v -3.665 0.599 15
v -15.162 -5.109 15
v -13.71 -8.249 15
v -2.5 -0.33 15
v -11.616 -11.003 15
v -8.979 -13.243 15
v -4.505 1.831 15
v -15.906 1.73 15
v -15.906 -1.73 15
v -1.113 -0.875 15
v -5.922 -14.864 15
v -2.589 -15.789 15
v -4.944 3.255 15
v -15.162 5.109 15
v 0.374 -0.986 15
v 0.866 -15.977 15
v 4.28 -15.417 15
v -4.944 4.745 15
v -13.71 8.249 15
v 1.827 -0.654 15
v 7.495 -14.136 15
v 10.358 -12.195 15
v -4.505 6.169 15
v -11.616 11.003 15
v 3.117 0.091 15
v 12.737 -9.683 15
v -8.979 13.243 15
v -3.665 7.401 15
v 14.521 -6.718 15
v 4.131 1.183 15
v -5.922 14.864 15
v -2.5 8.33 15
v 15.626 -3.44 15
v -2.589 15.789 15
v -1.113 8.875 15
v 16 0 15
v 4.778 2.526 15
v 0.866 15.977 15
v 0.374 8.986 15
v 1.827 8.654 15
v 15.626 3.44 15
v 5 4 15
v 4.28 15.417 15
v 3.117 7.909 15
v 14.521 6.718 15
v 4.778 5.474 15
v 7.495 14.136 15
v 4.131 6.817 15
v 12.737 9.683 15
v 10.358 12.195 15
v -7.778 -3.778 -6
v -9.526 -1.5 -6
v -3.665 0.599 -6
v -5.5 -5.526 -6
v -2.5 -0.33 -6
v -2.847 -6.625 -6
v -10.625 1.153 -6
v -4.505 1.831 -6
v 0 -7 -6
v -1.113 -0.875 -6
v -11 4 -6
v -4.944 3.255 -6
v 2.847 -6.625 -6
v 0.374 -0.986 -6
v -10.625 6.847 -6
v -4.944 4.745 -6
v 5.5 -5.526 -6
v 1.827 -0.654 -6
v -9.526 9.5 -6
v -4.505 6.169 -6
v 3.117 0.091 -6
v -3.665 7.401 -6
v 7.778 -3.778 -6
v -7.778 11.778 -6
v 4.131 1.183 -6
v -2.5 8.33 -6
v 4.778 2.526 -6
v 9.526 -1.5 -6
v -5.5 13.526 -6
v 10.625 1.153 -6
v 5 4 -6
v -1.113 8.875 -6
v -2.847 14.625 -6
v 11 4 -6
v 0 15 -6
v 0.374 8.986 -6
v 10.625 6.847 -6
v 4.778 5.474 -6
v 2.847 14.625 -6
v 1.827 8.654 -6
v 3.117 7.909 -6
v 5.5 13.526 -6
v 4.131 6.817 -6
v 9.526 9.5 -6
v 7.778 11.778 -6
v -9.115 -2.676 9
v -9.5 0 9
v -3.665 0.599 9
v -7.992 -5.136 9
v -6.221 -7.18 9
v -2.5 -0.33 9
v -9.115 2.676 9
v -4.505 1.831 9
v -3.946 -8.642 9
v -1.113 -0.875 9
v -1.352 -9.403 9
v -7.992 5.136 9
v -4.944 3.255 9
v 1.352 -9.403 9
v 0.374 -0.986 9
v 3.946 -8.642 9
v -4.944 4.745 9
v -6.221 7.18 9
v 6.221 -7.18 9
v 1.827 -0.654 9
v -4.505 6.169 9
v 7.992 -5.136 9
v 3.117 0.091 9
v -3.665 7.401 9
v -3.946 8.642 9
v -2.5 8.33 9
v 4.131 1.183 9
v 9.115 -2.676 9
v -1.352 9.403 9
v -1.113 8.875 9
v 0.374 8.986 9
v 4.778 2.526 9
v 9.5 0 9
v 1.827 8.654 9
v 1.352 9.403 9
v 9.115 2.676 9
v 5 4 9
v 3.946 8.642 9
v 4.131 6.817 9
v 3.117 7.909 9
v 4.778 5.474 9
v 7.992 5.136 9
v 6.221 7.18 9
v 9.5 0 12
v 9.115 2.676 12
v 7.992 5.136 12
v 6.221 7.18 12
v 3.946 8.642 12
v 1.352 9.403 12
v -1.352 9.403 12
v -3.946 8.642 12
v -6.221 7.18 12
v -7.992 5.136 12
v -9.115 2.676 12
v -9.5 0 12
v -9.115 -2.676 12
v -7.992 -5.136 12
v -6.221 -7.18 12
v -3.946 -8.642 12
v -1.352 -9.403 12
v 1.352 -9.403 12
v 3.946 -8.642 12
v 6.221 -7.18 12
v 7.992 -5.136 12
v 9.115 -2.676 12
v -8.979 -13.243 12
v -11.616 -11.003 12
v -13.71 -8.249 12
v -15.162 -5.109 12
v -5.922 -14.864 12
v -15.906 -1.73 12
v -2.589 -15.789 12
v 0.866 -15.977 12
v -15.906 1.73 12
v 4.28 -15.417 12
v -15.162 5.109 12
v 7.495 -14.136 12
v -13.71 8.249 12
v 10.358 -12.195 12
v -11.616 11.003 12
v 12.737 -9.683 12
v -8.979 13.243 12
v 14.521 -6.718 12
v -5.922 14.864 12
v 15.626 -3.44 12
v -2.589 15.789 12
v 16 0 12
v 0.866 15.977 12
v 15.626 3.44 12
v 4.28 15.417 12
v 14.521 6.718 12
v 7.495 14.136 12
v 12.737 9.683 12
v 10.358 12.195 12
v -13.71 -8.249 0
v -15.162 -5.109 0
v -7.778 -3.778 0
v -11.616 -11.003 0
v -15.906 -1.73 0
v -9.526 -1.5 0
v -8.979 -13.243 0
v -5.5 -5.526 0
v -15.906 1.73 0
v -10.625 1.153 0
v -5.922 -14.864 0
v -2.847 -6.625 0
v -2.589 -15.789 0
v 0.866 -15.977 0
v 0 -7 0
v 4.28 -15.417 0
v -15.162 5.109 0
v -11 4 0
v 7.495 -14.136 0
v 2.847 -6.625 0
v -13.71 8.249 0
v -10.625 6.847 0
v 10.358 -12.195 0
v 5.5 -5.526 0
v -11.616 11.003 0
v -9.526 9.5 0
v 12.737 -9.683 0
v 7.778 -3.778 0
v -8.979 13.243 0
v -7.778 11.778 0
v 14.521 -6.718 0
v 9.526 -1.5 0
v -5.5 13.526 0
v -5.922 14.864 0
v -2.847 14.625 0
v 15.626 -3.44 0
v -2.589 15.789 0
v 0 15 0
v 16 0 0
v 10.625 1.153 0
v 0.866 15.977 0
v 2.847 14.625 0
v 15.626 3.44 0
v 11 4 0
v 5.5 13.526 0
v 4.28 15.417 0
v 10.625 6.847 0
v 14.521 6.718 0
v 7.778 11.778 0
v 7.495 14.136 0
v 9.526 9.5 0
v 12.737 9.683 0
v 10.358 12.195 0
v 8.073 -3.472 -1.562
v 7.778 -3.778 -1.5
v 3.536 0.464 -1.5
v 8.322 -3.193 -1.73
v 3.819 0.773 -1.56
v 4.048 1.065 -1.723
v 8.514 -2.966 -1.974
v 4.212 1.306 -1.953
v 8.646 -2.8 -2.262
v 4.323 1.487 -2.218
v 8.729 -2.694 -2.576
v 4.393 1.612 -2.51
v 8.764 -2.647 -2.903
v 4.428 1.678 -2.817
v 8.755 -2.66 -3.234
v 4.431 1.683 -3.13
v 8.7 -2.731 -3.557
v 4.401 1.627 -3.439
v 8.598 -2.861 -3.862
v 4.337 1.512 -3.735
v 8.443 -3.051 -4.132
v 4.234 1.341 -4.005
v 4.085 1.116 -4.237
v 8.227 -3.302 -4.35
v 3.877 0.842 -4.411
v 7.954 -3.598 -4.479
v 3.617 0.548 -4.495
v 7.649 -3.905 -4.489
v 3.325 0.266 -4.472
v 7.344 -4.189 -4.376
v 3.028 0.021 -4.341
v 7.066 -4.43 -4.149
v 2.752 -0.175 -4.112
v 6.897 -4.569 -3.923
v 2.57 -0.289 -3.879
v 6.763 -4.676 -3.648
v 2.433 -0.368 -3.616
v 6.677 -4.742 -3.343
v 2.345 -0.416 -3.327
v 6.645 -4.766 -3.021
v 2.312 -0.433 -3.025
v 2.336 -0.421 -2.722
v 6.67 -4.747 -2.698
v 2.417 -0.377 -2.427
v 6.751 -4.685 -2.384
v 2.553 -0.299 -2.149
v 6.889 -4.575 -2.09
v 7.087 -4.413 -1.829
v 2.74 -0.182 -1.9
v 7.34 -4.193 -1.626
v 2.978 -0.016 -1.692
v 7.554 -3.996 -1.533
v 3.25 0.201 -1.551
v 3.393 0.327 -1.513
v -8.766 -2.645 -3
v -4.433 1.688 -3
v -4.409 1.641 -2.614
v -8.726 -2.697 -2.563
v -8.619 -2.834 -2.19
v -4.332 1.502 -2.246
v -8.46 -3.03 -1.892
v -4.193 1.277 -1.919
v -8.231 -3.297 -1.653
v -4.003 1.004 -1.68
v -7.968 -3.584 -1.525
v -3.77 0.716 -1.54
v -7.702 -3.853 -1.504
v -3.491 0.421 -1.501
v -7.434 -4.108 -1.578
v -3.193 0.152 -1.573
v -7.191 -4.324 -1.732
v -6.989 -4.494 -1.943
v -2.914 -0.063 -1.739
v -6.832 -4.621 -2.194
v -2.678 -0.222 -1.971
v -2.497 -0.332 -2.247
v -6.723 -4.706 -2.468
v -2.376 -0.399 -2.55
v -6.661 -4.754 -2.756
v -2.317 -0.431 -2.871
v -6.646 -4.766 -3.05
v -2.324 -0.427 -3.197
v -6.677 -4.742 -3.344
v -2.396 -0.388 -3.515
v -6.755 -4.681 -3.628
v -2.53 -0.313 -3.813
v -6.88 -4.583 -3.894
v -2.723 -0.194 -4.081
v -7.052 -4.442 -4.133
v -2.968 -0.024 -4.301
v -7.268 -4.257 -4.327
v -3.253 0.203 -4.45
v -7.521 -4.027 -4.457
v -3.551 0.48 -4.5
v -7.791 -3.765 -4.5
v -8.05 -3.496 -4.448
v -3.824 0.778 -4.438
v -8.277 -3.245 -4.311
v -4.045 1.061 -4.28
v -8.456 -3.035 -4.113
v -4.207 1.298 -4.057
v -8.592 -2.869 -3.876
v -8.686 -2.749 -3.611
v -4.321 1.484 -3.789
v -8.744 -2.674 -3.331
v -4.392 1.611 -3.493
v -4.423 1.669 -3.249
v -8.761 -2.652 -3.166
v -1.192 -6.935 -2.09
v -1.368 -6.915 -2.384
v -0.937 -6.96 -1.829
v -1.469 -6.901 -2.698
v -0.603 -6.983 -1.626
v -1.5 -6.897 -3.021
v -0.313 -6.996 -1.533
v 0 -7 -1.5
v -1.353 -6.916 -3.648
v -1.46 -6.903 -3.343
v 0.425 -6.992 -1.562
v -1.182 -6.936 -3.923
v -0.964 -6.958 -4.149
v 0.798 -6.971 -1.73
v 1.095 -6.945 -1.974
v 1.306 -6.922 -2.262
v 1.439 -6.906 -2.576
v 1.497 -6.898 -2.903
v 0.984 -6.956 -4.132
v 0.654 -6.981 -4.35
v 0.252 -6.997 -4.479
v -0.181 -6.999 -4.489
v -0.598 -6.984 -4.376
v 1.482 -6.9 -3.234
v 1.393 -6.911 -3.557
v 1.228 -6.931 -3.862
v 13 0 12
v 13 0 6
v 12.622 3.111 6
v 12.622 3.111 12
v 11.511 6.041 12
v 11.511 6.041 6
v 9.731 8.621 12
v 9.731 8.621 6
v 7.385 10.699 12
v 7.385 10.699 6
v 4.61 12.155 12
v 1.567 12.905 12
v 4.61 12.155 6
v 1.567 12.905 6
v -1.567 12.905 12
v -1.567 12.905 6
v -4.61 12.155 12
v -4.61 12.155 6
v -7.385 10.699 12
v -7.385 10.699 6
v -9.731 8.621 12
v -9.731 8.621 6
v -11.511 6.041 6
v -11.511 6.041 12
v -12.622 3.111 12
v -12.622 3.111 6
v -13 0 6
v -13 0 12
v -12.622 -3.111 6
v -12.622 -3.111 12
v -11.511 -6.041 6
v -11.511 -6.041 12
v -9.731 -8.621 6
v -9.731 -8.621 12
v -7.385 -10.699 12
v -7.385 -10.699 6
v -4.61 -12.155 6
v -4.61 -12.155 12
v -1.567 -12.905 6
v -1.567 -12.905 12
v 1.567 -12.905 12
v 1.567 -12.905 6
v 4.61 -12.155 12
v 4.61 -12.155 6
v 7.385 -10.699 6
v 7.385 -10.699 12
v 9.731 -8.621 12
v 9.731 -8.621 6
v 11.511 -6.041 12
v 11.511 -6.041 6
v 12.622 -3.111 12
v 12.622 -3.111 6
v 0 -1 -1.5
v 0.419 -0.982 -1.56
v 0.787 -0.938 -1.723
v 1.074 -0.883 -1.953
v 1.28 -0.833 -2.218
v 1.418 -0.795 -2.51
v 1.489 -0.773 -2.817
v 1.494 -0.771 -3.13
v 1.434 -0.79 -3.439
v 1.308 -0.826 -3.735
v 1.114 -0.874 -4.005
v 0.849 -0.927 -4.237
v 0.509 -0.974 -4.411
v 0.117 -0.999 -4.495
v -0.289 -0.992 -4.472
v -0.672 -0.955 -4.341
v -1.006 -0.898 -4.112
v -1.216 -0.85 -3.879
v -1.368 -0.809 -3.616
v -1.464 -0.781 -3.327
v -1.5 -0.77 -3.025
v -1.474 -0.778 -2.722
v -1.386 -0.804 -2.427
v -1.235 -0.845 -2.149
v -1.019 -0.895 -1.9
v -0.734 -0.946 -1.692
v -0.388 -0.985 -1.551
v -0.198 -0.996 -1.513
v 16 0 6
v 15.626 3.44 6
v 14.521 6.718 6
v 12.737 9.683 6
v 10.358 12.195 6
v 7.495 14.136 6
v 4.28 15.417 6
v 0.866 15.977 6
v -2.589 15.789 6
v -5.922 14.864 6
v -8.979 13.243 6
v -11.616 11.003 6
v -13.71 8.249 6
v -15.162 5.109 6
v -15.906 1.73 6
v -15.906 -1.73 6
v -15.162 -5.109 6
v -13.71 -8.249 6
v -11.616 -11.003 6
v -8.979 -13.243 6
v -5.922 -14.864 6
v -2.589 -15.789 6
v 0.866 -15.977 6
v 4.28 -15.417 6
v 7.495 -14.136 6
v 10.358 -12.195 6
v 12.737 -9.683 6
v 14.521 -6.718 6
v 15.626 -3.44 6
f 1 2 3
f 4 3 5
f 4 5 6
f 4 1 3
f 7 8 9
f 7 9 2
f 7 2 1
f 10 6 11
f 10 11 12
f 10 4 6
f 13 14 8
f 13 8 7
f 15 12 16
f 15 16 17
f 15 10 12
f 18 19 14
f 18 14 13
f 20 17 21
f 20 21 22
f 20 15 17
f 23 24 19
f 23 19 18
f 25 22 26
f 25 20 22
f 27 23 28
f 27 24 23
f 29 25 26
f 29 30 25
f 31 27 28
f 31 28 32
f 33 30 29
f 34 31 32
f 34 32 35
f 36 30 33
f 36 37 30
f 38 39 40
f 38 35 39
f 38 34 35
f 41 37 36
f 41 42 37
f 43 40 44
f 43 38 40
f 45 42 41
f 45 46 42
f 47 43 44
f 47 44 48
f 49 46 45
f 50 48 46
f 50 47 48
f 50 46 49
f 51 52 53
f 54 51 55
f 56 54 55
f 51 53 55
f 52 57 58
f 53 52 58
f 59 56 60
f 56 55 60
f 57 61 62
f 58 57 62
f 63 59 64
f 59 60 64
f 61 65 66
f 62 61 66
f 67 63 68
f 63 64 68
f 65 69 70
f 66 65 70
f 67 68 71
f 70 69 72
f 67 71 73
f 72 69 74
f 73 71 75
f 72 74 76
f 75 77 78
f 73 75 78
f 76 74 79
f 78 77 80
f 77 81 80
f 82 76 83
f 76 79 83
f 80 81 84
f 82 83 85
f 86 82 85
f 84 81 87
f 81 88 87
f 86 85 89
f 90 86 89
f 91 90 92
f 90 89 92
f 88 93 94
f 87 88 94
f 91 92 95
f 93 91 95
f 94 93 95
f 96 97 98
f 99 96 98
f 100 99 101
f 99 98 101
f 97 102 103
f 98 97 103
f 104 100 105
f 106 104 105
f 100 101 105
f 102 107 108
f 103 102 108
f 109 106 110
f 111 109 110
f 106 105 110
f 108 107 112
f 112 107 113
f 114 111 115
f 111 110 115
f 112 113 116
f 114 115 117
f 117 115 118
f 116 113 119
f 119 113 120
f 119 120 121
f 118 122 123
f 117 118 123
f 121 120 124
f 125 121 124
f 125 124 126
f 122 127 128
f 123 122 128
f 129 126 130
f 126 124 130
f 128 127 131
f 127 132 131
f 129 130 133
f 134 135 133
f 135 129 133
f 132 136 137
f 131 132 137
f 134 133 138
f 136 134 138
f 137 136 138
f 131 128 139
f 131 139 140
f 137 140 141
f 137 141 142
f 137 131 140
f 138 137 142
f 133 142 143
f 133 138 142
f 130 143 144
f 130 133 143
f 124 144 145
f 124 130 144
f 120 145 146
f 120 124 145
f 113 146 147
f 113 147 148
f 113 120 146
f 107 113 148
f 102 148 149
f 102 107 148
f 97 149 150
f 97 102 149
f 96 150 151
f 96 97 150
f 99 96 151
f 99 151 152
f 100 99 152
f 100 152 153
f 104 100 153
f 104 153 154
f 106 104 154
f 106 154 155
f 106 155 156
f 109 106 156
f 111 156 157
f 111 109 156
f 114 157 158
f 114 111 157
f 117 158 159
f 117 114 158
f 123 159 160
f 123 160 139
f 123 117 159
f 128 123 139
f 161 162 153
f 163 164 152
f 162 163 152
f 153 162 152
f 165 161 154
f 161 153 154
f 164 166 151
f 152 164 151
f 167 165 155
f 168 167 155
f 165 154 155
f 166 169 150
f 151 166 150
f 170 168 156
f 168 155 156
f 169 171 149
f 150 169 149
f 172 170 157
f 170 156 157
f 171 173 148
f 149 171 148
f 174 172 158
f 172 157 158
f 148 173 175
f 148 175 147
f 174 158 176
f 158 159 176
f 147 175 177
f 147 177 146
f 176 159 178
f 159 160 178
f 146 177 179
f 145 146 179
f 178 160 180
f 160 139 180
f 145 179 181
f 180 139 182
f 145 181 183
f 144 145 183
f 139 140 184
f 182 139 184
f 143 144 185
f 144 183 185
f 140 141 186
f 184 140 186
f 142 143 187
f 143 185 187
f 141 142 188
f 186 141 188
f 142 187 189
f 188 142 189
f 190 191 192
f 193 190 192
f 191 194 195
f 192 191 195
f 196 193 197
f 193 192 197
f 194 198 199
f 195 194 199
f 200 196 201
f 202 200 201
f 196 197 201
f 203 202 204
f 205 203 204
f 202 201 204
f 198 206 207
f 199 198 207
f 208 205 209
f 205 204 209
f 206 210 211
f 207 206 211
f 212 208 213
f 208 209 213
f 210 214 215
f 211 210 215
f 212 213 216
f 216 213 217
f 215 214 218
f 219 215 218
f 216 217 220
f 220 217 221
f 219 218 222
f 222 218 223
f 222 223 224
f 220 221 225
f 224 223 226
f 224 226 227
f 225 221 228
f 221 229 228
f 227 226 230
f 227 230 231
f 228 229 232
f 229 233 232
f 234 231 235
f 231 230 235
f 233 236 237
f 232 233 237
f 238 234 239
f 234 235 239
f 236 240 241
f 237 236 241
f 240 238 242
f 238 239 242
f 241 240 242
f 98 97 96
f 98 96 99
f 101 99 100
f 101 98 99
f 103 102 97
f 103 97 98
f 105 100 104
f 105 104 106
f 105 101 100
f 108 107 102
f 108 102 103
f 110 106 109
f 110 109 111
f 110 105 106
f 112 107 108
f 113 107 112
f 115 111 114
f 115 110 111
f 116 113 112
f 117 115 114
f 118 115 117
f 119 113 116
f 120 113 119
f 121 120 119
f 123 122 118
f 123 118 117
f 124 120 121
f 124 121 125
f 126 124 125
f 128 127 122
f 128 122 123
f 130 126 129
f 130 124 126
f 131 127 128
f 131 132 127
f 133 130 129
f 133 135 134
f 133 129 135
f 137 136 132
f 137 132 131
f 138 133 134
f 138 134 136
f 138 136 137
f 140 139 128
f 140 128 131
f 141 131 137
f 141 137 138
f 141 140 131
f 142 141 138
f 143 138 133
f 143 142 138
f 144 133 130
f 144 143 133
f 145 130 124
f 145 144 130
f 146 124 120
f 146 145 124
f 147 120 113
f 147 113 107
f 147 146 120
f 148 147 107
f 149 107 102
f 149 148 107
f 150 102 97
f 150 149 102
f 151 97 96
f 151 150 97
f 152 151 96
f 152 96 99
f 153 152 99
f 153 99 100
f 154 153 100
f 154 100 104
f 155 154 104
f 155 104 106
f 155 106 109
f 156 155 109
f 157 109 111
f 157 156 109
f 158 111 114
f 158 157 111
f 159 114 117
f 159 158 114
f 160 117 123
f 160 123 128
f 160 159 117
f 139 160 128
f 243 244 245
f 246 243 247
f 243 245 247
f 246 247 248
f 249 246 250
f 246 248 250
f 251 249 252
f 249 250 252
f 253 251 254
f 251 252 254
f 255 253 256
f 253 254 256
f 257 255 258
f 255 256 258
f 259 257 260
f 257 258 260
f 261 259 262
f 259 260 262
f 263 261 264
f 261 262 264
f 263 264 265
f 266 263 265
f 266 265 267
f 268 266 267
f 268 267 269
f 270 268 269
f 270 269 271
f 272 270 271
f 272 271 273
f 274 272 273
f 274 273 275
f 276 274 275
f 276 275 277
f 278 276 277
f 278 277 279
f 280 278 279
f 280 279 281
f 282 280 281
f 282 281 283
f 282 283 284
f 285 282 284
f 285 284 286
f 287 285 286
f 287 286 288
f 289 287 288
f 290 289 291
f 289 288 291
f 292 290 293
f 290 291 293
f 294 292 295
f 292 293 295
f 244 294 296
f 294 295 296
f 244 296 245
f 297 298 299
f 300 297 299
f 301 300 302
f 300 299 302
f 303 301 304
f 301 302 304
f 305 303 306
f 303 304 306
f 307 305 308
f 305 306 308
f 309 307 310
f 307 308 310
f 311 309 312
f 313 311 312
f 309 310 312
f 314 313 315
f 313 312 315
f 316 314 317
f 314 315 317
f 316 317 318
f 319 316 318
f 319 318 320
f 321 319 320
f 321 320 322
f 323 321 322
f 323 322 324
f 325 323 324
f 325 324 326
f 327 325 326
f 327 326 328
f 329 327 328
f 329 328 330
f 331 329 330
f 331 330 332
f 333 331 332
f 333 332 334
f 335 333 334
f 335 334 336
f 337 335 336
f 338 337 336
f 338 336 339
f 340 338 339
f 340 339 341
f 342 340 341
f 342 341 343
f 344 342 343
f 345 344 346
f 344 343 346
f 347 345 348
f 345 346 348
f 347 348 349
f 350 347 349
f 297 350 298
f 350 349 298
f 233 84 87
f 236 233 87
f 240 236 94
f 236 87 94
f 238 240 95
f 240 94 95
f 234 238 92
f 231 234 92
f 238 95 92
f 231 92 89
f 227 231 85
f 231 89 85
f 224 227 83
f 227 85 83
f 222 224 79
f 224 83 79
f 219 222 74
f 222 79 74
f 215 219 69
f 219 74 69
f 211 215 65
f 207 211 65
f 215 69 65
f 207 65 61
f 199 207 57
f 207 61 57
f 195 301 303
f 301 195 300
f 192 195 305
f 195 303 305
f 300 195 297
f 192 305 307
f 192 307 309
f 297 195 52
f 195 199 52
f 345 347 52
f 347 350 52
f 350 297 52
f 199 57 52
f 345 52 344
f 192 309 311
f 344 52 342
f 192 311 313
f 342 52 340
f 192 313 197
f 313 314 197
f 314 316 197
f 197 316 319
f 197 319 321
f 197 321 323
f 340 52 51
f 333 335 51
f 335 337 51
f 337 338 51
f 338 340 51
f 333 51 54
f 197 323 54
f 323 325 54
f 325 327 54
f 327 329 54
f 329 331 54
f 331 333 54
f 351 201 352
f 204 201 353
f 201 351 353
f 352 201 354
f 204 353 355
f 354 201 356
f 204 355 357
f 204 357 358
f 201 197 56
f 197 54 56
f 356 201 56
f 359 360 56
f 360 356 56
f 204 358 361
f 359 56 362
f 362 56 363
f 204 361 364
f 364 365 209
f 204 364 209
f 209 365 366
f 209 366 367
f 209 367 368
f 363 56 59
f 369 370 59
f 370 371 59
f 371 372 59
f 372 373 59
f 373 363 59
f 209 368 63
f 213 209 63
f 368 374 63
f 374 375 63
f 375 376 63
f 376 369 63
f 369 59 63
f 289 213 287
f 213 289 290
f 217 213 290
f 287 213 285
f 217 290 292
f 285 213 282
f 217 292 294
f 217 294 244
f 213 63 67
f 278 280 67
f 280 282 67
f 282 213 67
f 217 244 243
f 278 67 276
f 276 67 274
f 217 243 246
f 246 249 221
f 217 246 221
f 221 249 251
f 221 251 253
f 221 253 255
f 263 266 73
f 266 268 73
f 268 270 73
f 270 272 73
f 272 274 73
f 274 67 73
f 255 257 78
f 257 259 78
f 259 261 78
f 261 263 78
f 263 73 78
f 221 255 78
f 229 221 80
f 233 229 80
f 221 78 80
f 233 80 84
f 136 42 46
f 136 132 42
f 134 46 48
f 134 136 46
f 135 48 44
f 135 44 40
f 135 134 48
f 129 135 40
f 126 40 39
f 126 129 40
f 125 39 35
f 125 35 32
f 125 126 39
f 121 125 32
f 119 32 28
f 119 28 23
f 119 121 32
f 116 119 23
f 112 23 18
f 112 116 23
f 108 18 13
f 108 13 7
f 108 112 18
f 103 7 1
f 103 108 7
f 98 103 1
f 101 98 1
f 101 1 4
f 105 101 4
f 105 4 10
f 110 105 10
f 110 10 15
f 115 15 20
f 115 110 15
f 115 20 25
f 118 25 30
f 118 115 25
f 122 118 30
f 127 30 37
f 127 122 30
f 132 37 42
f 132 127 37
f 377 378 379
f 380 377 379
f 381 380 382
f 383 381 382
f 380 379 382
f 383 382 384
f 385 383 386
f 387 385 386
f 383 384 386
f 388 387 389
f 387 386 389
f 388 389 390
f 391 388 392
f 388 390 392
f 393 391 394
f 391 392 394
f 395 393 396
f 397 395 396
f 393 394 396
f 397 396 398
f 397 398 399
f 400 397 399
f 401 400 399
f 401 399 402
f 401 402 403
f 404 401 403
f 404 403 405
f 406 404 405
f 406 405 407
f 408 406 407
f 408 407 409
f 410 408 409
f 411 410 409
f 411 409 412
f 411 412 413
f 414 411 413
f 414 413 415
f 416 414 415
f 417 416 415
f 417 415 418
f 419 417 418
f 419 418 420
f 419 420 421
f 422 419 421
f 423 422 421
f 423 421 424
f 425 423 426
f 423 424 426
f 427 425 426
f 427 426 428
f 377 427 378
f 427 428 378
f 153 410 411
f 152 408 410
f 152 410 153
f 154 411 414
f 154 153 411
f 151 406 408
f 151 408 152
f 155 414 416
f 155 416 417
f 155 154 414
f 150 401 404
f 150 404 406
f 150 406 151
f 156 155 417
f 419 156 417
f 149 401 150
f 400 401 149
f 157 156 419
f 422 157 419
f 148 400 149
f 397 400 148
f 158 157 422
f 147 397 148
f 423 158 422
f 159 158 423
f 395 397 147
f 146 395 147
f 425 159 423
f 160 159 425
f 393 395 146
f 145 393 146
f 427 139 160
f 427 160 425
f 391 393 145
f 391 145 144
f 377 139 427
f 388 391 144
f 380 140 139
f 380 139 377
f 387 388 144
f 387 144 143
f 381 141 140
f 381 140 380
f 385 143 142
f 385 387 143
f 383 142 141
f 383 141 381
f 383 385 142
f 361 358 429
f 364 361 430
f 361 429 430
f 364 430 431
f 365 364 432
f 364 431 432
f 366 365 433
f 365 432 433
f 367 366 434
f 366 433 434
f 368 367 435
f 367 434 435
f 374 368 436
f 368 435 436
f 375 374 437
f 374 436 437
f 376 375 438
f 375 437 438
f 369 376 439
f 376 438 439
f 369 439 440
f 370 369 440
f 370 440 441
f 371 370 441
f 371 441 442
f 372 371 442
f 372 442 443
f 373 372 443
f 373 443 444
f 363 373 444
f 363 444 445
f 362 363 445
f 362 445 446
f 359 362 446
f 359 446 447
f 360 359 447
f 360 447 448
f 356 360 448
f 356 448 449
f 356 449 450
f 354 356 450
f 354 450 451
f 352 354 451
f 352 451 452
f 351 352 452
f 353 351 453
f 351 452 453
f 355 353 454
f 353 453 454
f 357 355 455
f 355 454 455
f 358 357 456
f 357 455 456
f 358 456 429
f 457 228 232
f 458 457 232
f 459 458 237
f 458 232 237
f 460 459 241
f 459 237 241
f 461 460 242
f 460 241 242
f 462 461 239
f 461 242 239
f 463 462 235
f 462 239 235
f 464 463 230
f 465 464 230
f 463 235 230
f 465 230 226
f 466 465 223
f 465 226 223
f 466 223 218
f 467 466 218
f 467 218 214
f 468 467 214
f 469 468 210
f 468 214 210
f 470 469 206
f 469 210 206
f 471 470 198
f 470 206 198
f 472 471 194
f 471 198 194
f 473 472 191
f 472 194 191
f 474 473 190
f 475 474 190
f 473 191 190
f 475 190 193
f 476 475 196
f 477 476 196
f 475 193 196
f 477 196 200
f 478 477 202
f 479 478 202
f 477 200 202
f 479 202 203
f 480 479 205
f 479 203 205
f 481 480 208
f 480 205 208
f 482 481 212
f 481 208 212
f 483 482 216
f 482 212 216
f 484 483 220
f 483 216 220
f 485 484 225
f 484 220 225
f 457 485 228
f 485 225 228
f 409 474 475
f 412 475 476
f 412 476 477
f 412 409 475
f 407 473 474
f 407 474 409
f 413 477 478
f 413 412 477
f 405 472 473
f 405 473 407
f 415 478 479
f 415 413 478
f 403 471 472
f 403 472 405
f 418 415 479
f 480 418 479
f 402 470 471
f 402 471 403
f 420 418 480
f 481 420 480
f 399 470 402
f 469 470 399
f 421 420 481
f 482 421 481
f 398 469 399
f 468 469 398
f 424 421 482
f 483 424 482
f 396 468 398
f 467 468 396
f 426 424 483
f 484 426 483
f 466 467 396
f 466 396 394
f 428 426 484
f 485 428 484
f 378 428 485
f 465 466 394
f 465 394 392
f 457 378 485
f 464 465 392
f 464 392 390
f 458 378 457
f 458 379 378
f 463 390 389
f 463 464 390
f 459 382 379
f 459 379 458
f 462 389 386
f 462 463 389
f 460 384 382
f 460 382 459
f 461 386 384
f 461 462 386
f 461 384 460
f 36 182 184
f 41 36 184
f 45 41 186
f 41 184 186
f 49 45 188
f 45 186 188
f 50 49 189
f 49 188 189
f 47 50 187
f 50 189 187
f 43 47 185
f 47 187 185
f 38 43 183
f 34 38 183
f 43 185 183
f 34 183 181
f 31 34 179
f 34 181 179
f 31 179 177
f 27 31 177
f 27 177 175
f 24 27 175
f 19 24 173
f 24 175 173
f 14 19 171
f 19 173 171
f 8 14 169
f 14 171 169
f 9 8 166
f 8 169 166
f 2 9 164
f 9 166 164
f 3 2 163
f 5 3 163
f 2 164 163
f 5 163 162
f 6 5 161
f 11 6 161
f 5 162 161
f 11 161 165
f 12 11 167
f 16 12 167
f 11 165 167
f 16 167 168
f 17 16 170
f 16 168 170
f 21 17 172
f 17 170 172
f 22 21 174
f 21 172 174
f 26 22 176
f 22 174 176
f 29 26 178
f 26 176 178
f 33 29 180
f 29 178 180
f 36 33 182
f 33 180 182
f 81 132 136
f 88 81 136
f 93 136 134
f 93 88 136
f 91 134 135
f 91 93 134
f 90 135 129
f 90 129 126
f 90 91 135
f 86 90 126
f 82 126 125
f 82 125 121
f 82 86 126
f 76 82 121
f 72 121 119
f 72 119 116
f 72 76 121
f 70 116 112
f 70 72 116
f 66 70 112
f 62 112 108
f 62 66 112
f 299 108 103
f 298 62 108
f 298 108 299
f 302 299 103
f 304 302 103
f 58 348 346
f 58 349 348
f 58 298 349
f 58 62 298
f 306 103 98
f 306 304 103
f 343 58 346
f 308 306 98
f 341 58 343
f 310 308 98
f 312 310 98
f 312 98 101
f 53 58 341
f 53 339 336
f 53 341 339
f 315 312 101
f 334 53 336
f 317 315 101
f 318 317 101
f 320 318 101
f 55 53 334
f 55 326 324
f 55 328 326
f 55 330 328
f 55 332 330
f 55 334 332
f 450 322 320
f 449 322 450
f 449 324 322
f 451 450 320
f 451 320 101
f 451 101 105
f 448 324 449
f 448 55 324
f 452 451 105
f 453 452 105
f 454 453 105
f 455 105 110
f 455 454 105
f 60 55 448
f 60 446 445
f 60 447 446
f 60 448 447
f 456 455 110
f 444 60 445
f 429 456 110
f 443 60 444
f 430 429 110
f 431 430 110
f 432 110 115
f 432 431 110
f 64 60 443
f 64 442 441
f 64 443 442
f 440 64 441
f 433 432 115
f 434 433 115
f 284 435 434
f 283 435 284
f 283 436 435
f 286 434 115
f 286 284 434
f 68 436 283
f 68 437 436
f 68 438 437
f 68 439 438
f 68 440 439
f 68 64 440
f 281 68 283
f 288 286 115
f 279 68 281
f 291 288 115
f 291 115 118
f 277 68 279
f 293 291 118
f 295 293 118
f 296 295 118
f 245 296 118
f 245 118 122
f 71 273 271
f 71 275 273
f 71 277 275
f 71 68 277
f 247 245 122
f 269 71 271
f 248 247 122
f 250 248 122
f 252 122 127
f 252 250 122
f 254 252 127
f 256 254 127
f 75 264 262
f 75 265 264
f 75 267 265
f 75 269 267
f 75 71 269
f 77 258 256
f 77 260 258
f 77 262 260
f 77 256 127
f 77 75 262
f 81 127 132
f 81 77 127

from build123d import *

# Parameters (mm, degrees)
SKETCH1_R                 = 16
SKETCH1_R_2               = 13
BOSS_EXTRUDE1_DEPTH       = 6
SKETCH1_4_R               = 13
SKETCH1_4_R_2             = 5
BOSS_EXTRUDE2_DEPTH       = 12
BOSS_EXTRUDE3_START       = -6
SKETCH1_5_R               = 11
SKETCH1_5_R_2             = 5
BOSS_EXTRUDE3_DEPTH       = 6
CUT_EXTRUDE1_START        = -3
SKETCH2_R                 = 9.5
SKETCH2_R_2               = 5
CUT_EXTRUDE1_DEPTH        = 3
SKETCH2_3_R               = 9.5
SKETCH2_3_R_2             = 5
BOSS_EXTRUDE4_DEPTH       = 3
SKETCH3_R                 = 16
SKETCH3_R_2               = 5
BOSS_EXTRUDE5_DEPTH       = 3
CUT_EXTRUDE2_REACH        = 29.148
CUT_EXTRUDE2_END_RADIUS   = 11
SKETCH4_R                 = 1.5
CIRPATTERN1_COUNT         = 2
CIRPATTERN1_ANGLE         = 45
MIRROR1_COPY_1_REACH      = 29.148
MIRROR1_COPY_1_END_RADIUS = 11
MIRROR1_COPY_1_SKETCH_R   = 1.5


with BuildPart() as part:
    # Sketch1 → Boss-Extrude1 (new body)
    with BuildSketch(Plane.XY):
        Circle(SKETCH1_R)
        Circle(SKETCH1_R_2, mode=Mode.SUBTRACT)
    extrude(amount=BOSS_EXTRUDE1_DEPTH)

    # Sketch1<4> → Boss-Extrude2 (add)
    with BuildSketch(Plane.XY):
        Circle(SKETCH1_4_R)
        with Locations((0, 4)):
            Circle(SKETCH1_4_R_2, mode=Mode.SUBTRACT)
    extrude(amount=BOSS_EXTRUDE2_DEPTH)

    # Sketch1<5> → Boss-Extrude3 (add)
    with BuildSketch(Plane.XY.offset(BOSS_EXTRUDE3_START)):
        with Locations((0, 4)):
            Circle(SKETCH1_5_R)
        with Locations((0, 4)):
            Circle(SKETCH1_5_R_2, mode=Mode.SUBTRACT)
    extrude(amount=BOSS_EXTRUDE3_DEPTH)

    # Sketch2 → Cut-Extrude1 (cut)
    with BuildSketch(Plane.XY.offset(12).offset(CUT_EXTRUDE1_START)):
        Circle(SKETCH2_R)
        with Locations((0, 4)):
            Circle(SKETCH2_R_2, mode=Mode.SUBTRACT)
    extrude(amount=CUT_EXTRUDE1_DEPTH, mode=Mode.SUBTRACT)

    # Cut-Extrude2: up to this cylinder (the profile starts inside it)
    cut_extrude2_end = Plane(origin=(0, 4, -3), z_dir=(0, 0, 1)) * Cylinder(CUT_EXTRUDE2_END_RADIUS, 81.296, mode=Mode.PRIVATE)
    # Sketch4 → Cut-Extrude2 (cut, up to the surface)
    with BuildSketch(Plane(origin=(0, 0, 0), x_dir=(1, 0, 0), z_dir=(0, 1, 0)), mode=Mode.PRIVATE) as cut_extrude2_sk1:
        with Locations(Location((0, 3, 0), (0, 0, 270))):
            Circle(SKETCH4_R)
    cut_extrude2_tool1 = extrude(cut_extrude2_sk1.sketch, amount=-CUT_EXTRUDE2_REACH, mode=Mode.PRIVATE) & cut_extrude2_end
    cut_extrude2 = cut_extrude2_tool1.solids().sort_by_distance((0, 0, -3))[0]
    add(cut_extrude2, mode=Mode.SUBTRACT)

    # CirPattern1: Cut-Extrude2 ×2 about axis
    cirpattern1_axis = Axis((0, 4, -6), (0, 0, 1))
    for i in range(1, CIRPATTERN1_COUNT):
        add(cut_extrude2.rotate(cirpattern1_axis, i * CIRPATTERN1_ANGLE / (CIRPATTERN1_COUNT - 1)), mode=Mode.SUBTRACT)

    # Mirror1 copy 1: up to this cylinder (the profile starts inside it)
    mirror1_copy_1_end = Plane(origin=(0, 4, -3), z_dir=(0, 0, 1)) * Cylinder(MIRROR1_COPY_1_END_RADIUS, 81.296, mode=Mode.PRIVATE)
    # Mirror1 copy 1 sketch → Mirror1 copy 1 (cut, up to the surface)
    with BuildSketch(Plane(origin=(-2.828427125, 1.171572875, 0), x_dir=(-0.7071067811865462, 0.7071067811865488, 0), z_dir=(0.7071067811865488, 0.7071067811865462, 0)), mode=Mode.PRIVATE) as mirror1_copy_1_sk1:
        with Locations((0, -3)):
            Circle(MIRROR1_COPY_1_SKETCH_R)
    mirror1_copy_1_tool1 = extrude(mirror1_copy_1_sk1.sketch, amount=-MIRROR1_COPY_1_REACH, mode=Mode.PRIVATE) & mirror1_copy_1_end
    add(mirror1_copy_1_tool1.solids().sort_by_distance((0, 0, -3))[0], mode=Mode.SUBTRACT)


with BuildPart() as body_2:
    # Sketch2<3> → Boss-Extrude4 (new body)
    with BuildSketch(Plane.XY.offset(12)):
        Circle(SKETCH2_3_R)
        with Locations((0, 4)):
            Circle(SKETCH2_3_R_2, mode=Mode.SUBTRACT)
    extrude(amount=-BOSS_EXTRUDE4_DEPTH)

    # Sketch3 → Boss-Extrude5 (add)
    with BuildSketch(Plane.XY.offset(12)):
        Circle(SKETCH3_R)
        with Locations((0, 4)):
            Circle(SKETCH3_R_2, mode=Mode.SUBTRACT)
    extrude(amount=BOSS_EXTRUDE5_DEPTH)


solid = Compound([part.part, body_2.part])
